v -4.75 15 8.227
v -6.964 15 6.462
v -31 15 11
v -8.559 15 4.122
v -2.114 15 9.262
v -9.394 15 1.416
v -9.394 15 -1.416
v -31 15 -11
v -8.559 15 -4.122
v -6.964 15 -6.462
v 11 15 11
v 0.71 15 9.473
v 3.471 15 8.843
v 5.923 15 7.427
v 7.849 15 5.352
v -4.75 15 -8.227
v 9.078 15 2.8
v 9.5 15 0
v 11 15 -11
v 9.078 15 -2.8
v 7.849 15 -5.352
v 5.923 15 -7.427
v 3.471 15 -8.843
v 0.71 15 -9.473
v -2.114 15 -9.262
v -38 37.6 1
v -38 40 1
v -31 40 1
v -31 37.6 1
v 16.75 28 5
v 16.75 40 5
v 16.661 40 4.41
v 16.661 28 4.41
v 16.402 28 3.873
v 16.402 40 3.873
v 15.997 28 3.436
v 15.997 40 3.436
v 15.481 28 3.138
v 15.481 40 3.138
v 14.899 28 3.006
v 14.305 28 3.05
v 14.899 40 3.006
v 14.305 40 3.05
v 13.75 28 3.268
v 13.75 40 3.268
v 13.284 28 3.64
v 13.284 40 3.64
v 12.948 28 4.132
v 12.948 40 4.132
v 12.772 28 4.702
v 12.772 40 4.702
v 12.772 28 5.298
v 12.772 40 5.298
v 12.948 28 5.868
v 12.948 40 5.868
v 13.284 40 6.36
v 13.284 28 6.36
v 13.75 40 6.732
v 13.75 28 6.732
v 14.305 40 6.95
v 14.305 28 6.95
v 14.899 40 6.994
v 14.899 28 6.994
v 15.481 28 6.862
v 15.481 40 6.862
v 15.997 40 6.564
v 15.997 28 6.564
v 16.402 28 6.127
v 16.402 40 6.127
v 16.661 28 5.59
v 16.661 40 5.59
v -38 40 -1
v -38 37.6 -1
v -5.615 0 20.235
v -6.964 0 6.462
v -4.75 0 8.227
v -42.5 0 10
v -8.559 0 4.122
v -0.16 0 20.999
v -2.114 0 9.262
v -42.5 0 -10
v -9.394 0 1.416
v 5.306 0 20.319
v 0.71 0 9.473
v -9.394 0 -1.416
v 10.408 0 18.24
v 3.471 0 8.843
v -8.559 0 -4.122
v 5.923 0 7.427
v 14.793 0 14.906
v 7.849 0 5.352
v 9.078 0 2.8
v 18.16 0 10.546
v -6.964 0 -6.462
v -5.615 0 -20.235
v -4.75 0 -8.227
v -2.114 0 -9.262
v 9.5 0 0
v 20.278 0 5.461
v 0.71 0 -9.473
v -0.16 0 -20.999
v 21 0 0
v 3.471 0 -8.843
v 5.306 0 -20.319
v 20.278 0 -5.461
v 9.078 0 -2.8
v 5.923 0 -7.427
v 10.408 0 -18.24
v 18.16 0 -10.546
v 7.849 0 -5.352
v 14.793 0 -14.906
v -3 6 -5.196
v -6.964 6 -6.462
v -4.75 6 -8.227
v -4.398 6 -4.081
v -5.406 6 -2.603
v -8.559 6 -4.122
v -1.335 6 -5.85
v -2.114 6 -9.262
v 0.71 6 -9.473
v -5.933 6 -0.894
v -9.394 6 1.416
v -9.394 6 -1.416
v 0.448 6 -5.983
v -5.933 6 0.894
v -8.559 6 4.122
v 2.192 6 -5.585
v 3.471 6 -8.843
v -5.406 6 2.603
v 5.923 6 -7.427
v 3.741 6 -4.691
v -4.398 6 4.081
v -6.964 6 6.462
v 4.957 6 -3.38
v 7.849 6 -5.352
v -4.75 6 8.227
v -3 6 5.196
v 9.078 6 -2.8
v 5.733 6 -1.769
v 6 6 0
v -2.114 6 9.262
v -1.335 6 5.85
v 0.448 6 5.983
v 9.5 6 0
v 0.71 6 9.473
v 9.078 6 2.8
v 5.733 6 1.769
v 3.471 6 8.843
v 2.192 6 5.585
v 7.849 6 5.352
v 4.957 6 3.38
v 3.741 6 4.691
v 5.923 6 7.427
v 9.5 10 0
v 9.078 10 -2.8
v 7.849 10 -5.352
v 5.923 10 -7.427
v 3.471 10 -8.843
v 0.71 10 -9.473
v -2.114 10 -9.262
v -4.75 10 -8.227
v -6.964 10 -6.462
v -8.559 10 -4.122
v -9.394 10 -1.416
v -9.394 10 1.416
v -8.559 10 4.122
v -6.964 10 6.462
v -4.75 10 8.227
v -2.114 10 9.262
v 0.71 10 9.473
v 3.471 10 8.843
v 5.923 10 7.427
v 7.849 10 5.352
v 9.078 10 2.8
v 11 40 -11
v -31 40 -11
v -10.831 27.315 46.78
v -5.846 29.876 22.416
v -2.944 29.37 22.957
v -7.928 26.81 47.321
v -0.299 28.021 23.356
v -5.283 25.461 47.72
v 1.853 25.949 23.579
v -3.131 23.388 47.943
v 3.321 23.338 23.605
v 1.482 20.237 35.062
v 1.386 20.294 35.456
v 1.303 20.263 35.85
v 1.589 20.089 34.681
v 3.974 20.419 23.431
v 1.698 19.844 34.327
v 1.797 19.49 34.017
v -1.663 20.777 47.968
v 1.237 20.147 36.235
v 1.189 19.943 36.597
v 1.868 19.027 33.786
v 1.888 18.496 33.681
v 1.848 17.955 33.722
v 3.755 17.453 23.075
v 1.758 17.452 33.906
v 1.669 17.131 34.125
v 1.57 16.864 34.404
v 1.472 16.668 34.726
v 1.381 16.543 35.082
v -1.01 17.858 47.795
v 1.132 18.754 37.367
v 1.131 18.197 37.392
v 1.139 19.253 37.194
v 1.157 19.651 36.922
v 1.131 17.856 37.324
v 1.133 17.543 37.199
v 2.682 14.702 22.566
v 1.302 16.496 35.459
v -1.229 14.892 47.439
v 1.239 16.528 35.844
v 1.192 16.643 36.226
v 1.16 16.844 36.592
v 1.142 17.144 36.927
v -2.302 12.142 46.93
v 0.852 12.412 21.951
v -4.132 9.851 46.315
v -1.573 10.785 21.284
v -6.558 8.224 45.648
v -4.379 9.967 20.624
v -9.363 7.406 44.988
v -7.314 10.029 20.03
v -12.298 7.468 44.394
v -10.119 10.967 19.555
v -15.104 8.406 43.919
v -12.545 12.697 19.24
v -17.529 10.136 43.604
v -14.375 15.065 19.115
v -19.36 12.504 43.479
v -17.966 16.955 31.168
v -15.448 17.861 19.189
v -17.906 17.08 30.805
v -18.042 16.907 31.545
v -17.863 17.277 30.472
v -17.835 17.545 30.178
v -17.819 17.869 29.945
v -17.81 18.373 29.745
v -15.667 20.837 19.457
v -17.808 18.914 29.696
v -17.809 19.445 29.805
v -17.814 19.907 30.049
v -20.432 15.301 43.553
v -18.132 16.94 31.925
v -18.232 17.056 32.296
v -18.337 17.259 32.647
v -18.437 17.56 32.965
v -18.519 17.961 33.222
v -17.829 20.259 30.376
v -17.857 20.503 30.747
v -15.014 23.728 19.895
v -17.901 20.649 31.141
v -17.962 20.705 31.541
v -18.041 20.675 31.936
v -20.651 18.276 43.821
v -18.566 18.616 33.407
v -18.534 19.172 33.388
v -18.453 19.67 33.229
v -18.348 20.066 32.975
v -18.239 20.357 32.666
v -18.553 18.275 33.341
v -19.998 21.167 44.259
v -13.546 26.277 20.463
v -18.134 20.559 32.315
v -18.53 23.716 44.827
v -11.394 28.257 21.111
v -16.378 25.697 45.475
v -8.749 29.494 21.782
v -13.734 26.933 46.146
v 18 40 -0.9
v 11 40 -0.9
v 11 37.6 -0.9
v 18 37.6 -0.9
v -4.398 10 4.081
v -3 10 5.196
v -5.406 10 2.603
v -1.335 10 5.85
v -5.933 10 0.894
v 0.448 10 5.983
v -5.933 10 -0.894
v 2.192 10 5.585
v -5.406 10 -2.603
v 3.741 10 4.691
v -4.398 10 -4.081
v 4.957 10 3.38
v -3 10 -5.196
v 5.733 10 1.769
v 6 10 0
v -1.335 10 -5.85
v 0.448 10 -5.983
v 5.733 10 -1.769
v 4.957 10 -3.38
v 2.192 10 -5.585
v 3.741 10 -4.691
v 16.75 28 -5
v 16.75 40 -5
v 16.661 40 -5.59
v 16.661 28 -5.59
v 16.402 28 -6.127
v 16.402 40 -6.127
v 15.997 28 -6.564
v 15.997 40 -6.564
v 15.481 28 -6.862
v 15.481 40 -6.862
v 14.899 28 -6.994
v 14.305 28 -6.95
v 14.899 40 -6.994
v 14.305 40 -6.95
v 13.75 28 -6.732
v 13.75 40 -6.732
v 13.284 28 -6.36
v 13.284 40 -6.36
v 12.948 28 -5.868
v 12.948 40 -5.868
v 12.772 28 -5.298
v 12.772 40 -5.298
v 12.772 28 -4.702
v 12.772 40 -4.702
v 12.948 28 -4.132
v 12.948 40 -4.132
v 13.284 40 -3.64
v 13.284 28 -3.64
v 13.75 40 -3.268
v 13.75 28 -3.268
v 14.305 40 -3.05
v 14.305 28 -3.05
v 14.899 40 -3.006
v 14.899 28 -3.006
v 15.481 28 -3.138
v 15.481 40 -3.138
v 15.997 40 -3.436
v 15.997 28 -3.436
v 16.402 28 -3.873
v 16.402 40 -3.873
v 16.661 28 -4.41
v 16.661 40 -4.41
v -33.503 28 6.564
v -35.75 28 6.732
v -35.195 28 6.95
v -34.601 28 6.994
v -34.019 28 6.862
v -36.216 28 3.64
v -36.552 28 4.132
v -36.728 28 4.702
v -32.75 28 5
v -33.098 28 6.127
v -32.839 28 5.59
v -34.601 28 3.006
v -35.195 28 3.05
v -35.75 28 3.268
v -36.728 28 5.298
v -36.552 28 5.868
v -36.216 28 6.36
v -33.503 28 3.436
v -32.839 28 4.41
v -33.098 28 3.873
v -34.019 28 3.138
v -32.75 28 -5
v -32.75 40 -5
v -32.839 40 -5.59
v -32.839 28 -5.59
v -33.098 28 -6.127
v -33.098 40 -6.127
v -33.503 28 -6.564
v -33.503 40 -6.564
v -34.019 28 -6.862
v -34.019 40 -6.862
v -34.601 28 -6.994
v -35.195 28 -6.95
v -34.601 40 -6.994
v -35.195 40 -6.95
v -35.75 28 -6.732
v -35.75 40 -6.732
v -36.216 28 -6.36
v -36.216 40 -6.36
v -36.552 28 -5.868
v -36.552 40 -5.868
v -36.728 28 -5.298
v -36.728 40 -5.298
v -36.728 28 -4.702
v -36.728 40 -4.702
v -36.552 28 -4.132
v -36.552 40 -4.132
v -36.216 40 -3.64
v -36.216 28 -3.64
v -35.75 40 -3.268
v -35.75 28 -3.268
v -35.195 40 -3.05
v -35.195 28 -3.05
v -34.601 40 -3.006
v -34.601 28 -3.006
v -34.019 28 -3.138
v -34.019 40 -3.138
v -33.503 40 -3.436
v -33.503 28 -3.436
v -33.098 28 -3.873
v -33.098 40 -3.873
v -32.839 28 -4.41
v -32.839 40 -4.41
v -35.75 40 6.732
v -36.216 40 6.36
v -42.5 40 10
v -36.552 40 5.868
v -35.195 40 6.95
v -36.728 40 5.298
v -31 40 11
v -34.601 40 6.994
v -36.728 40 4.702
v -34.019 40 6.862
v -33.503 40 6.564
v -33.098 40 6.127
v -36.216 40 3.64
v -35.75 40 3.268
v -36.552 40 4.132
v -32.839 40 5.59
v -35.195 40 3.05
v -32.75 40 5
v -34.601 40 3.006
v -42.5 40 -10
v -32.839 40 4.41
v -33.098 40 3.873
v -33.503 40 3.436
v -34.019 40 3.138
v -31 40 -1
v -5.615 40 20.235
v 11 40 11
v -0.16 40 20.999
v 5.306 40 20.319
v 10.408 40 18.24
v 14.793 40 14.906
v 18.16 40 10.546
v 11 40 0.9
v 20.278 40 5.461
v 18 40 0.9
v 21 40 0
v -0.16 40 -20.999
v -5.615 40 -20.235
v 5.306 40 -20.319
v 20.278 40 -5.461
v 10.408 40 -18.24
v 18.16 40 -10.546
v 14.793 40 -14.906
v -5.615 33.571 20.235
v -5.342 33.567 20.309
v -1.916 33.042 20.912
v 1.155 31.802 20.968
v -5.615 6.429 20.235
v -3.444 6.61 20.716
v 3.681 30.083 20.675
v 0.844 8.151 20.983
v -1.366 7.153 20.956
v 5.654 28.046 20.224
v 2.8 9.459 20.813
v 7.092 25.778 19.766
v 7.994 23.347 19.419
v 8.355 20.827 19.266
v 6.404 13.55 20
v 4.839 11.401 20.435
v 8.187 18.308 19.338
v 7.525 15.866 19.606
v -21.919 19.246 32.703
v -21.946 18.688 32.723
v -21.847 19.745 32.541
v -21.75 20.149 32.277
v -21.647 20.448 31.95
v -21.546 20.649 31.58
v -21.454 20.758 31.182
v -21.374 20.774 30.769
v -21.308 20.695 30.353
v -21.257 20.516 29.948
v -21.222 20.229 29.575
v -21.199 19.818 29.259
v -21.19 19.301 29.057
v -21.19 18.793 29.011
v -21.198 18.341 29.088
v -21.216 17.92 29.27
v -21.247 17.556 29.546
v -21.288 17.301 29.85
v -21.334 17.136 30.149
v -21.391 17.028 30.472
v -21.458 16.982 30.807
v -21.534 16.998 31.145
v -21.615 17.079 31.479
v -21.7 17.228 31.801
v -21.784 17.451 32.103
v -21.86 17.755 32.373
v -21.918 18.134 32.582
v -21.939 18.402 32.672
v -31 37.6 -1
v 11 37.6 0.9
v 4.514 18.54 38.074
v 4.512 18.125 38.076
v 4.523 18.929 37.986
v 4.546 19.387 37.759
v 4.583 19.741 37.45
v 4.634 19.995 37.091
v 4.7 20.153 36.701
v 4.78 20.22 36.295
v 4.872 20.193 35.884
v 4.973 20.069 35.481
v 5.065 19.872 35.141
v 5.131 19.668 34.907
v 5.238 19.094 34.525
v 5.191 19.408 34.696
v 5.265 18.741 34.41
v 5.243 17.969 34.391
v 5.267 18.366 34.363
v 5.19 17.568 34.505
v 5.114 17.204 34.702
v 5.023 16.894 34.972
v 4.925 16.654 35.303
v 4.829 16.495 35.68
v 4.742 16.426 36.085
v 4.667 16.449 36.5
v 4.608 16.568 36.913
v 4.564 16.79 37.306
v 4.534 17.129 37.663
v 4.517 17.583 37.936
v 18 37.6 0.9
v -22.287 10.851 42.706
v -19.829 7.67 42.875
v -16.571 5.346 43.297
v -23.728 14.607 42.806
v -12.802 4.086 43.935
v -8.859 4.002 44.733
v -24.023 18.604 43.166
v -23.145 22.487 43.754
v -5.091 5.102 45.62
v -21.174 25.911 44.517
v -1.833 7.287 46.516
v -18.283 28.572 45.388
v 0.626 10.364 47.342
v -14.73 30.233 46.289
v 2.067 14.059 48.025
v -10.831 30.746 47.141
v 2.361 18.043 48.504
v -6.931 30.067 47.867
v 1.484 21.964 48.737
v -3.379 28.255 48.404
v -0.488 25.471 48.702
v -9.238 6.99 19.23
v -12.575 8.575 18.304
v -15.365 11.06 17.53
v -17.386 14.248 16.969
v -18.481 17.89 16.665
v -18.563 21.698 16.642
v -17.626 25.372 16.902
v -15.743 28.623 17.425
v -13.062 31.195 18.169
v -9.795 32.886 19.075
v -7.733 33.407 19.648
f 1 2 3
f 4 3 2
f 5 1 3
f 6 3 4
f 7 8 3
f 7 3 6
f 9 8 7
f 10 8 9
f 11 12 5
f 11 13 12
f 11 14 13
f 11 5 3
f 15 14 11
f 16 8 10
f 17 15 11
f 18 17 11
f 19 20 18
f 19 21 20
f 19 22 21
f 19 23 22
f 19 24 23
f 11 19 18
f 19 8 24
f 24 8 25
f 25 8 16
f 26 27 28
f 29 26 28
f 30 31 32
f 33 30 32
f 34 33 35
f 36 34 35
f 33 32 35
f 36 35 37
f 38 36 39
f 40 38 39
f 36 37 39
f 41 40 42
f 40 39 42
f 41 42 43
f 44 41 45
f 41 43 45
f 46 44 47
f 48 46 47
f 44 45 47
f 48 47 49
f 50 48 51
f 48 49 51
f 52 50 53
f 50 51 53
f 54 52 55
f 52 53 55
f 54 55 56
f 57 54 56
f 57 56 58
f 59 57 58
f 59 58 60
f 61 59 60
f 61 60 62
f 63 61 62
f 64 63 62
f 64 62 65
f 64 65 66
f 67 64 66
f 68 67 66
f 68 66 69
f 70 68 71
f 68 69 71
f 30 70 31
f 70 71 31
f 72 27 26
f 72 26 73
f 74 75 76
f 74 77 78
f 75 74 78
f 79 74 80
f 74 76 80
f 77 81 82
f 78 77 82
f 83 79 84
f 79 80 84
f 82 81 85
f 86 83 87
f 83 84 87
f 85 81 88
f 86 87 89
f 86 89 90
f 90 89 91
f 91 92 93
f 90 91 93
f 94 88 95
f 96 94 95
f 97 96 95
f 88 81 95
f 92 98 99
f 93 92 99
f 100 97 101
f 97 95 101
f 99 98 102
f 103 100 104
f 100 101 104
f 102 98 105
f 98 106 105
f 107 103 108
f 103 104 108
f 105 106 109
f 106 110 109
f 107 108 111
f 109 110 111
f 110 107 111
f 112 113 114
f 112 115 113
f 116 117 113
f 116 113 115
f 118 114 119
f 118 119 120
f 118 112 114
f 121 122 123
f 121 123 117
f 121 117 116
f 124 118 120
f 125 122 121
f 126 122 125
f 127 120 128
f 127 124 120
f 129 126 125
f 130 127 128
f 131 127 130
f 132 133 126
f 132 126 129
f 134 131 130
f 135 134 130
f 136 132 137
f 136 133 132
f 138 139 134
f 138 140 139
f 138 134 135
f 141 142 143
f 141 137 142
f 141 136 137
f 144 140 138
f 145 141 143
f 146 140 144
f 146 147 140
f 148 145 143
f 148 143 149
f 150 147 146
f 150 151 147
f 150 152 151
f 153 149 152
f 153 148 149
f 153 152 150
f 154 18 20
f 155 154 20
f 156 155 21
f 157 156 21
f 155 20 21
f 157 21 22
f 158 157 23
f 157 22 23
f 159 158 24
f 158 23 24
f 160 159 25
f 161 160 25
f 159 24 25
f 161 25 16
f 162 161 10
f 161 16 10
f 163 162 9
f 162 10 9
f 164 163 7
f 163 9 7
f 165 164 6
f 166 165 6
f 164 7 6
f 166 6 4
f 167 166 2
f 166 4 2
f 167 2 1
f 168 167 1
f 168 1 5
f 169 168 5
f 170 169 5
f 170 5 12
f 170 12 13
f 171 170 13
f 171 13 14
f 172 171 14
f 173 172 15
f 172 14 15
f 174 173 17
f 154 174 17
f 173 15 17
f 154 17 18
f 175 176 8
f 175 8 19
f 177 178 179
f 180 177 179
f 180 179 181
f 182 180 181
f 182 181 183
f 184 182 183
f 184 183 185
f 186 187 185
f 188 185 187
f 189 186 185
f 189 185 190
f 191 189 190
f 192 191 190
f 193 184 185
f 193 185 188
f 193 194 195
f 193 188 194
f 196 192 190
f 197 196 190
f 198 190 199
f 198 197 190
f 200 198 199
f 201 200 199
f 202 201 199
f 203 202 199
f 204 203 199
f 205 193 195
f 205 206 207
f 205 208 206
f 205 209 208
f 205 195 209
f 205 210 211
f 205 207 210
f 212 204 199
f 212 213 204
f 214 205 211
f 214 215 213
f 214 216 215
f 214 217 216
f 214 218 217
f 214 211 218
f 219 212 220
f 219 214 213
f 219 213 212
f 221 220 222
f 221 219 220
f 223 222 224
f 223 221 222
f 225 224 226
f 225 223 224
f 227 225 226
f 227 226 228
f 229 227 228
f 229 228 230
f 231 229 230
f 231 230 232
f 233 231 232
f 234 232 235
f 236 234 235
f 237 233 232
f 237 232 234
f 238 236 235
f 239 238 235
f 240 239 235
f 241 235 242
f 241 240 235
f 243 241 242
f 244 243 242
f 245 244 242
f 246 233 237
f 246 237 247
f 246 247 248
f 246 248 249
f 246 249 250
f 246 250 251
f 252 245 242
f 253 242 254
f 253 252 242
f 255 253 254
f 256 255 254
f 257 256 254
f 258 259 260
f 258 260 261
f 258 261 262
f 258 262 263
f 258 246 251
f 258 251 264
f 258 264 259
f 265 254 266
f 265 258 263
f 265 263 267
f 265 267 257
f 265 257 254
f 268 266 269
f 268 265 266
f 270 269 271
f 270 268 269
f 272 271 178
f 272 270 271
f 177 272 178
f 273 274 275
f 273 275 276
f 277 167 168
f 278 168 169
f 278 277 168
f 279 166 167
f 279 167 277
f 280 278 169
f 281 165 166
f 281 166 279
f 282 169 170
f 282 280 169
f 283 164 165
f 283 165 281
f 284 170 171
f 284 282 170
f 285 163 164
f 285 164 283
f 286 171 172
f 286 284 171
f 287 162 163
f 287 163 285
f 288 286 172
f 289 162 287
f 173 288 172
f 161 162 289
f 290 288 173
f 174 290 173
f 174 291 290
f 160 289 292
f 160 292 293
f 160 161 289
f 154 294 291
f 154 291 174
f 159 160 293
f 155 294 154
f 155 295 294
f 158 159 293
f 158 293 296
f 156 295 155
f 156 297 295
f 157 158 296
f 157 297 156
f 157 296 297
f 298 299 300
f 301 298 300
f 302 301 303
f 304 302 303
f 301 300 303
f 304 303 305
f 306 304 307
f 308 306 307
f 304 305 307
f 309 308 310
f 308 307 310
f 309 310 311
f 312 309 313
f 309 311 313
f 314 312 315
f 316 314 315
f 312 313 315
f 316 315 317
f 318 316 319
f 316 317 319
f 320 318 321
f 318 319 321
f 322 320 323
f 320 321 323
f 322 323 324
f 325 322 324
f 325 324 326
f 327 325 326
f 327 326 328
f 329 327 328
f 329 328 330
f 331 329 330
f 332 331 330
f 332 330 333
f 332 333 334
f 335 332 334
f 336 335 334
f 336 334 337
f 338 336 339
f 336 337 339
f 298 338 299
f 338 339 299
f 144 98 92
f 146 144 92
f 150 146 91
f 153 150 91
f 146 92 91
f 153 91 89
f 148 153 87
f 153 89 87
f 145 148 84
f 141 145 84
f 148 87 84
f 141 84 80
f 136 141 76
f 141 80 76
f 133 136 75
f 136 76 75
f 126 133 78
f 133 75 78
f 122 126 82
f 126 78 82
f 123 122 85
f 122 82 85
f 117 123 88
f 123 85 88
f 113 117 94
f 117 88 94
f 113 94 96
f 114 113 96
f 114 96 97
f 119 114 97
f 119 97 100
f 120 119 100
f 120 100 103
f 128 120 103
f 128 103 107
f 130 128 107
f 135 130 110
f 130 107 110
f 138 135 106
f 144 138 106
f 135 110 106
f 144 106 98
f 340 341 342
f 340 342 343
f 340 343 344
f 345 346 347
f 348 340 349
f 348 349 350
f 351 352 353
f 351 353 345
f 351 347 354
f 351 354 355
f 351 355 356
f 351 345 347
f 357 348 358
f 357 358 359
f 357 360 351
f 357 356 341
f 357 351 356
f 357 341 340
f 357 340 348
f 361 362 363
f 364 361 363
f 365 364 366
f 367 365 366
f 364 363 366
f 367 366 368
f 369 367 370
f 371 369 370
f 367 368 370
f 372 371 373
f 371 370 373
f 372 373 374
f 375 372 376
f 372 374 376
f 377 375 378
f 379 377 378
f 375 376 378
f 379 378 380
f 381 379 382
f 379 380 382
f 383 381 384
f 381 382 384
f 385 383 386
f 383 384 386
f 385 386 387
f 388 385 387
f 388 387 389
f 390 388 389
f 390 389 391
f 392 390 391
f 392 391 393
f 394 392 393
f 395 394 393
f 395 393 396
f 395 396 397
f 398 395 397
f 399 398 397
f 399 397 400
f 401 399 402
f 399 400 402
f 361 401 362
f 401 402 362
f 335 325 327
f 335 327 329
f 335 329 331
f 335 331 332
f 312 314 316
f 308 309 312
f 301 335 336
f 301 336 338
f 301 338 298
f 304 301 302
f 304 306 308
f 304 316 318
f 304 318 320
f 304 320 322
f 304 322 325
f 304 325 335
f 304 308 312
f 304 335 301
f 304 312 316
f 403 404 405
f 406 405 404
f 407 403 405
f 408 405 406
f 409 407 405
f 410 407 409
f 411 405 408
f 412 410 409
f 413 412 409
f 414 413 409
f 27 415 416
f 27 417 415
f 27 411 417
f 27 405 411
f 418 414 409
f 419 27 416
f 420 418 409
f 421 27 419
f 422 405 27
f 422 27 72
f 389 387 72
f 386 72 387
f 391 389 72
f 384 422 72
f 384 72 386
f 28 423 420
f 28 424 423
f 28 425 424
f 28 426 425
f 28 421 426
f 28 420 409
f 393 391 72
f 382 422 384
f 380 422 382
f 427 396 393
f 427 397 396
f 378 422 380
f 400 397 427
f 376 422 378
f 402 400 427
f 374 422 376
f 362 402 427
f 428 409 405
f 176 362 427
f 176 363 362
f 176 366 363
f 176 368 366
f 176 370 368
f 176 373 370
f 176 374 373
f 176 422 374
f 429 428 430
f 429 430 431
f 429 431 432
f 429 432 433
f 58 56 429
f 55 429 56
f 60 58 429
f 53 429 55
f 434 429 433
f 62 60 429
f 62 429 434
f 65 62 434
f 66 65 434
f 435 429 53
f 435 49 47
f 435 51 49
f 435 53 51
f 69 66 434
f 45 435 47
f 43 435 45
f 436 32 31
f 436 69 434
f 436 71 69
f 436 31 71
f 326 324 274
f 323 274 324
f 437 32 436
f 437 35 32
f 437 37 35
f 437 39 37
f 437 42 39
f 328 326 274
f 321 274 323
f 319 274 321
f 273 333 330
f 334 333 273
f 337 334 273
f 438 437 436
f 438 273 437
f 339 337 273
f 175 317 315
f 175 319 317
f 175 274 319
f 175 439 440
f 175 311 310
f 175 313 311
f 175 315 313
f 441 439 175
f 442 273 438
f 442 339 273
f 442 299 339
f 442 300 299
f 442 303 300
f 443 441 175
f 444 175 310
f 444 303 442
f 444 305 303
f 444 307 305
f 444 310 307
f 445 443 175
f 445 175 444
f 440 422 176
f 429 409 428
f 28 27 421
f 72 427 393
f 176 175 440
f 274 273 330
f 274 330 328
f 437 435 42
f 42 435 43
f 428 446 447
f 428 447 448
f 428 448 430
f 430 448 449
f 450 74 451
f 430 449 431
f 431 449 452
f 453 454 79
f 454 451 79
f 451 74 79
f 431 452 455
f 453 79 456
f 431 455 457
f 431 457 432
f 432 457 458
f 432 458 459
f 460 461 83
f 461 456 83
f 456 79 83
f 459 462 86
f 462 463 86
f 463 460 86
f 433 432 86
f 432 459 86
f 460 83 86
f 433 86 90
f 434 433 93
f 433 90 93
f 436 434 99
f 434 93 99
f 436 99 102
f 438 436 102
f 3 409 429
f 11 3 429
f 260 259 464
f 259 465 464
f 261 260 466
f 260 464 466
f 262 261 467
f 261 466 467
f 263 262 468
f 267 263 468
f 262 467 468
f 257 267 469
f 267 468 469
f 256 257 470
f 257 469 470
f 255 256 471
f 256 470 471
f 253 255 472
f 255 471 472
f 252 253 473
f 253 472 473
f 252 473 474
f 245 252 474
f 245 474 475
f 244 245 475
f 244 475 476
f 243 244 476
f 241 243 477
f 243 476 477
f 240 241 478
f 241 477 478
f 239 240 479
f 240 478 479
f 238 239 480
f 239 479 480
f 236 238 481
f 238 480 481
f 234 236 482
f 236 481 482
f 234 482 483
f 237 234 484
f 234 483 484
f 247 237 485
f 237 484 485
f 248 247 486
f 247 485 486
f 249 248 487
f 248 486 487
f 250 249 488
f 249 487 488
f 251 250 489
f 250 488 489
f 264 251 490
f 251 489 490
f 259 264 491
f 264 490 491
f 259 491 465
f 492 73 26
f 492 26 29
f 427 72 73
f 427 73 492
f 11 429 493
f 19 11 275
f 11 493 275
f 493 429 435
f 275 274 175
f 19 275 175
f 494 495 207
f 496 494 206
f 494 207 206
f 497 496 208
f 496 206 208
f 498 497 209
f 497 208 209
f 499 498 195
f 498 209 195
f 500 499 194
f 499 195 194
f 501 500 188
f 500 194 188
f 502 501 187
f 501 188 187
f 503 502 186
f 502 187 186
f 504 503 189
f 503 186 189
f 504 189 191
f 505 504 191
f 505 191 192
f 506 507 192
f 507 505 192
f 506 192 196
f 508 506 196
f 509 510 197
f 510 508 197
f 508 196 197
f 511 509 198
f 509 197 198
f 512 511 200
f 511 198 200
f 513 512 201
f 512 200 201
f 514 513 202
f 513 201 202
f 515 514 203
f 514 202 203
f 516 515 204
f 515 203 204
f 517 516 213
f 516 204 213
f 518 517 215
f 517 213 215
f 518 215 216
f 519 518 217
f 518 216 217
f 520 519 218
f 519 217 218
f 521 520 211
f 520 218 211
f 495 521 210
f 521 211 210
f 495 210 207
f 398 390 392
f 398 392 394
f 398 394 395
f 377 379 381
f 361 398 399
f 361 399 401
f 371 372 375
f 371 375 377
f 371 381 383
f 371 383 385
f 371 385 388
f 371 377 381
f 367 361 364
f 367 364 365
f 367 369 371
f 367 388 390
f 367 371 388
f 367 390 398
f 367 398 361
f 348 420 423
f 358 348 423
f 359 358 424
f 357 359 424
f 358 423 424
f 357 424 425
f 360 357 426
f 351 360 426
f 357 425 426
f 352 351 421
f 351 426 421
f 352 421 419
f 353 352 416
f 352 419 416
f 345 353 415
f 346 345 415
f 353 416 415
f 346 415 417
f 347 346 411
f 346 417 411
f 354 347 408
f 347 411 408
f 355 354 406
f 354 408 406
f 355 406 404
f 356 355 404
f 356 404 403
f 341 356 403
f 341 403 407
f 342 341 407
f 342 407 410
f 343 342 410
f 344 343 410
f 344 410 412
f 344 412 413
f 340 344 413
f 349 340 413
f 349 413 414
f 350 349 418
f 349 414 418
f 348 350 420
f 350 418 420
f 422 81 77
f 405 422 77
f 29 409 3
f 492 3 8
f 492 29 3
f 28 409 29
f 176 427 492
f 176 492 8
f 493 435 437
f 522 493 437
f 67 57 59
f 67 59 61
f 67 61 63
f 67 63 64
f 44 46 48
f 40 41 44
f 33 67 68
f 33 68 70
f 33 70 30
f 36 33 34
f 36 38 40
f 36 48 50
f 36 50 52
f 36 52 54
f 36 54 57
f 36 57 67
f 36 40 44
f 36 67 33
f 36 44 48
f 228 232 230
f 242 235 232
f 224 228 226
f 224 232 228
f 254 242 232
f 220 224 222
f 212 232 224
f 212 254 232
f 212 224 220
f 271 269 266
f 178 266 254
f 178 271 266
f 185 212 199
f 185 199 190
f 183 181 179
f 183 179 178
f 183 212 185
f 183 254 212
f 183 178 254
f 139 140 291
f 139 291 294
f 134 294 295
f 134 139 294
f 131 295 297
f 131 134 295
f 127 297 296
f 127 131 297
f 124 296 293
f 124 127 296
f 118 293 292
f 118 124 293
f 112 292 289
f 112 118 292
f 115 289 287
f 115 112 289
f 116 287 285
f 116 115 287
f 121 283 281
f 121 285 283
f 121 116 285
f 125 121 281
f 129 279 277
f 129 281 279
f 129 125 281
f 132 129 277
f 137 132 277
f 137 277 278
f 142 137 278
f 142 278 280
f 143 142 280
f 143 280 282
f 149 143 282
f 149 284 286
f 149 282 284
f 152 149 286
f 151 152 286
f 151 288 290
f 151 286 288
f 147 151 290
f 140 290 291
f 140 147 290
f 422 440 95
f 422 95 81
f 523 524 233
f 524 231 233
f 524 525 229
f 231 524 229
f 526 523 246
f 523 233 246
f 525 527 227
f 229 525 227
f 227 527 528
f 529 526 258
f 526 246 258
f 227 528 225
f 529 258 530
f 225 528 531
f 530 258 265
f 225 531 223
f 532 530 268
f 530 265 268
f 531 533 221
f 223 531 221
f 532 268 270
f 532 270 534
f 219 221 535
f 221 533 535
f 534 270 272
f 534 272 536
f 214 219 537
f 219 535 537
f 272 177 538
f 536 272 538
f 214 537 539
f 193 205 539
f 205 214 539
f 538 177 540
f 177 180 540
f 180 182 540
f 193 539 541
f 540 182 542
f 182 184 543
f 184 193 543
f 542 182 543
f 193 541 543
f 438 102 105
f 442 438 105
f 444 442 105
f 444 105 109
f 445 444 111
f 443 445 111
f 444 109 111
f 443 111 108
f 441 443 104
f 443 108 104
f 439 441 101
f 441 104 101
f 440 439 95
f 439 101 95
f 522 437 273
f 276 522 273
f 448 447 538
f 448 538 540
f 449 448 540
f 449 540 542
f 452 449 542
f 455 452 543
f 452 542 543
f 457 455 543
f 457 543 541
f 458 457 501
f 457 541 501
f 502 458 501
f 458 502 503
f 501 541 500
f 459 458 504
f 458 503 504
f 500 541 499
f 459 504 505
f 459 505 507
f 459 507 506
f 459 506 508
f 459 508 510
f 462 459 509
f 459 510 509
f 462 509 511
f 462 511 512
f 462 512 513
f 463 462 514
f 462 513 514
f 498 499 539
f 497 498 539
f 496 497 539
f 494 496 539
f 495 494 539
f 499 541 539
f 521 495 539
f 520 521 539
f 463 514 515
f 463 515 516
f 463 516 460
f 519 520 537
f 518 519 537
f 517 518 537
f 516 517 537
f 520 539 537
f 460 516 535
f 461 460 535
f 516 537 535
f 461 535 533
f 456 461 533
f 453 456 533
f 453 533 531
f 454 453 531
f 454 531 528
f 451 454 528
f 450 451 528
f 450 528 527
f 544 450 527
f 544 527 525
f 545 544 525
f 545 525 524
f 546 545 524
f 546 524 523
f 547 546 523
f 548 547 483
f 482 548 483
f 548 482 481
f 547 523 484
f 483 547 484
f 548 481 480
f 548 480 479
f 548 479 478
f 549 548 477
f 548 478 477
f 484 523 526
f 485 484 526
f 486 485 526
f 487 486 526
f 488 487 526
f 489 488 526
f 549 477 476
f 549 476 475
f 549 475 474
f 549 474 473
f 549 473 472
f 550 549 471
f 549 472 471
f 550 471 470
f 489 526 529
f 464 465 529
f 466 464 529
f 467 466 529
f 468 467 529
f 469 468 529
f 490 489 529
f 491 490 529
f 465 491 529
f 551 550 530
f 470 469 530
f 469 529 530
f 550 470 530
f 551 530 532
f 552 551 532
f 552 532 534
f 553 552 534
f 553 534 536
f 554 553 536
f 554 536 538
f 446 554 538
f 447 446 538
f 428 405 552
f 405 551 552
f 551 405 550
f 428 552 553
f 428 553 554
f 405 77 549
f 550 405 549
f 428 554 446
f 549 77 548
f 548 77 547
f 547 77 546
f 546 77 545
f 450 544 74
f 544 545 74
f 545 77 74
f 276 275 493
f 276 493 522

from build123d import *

# Parameters (mm, degrees)
SKETCH1_R           = 6
BOSS_EXTRUDE1_DEPTH = 40
SKETCH2_W           = 42
SKETCH2_H           = 22
CUT_EXTRUDE1_DEPTH  = 25
SKETCH3_R           = 2
CUT_EXTRUDE2_DEPTH  = 12
SKETCH4_R           = 9.5
CUT_EXTRUDE3_DEPTH  = 5
CUT_EXTRUDE4_START  = -6
SKETCH5_R           = 9.5
CUT_EXTRUDE4_DEPTH  = 6
SKETCH7_W           = 7
SKETCH7_H           = 2
SKETCH7_H_2         = 1.8
CUT_EXTRUDE5_DEPTH  = 2.4
BOSS_EXTRUDE2_REACH = 87.524
SKETCH9_R           = 13.5
SKETCH9_R_2         = 10.05
BOSS_EXTRUDE3_REACH = 71.909
SKETCH10_R          = 10.05
SKETCH11_R          = 1.9
CUT_EXTRUDE7_DEPTH  = 13.5


with BuildPart() as part:
    # Sketch1 → Boss-Extrude1 (new body)
    with BuildSketch(Plane(origin=(0, 0, 0), x_dir=(1, 0, 0), z_dir=(0, 1, 0))):
        with BuildLine():
            Line((-42.5, -10), (-5.61521172, -20.235350191))
            ThreePointArc((-5.61521172, -20.235350191), (21, 0), (-5.61521172, 20.235350191))
            Line((-5.61521172, 20.235350191), (-42.5, 10))
            Line((-42.5, 10), (-42.5, -10))
        make_face()
        Circle(SKETCH1_R, mode=Mode.SUBTRACT)
    extrude(amount=BOSS_EXTRUDE1_DEPTH)

    # Sketch2 → Cut-Extrude1 (cut)
    with BuildSketch(Plane(origin=(0, 40, 0), x_dir=(1, 0, 0), z_dir=(0, 1, 0))):
        with Locations((-10, 0)):
            Rectangle(SKETCH2_W, SKETCH2_H)
    extrude(amount=-CUT_EXTRUDE1_DEPTH, mode=Mode.SUBTRACT)

    # Sketch3 → Cut-Extrude2 (cut)
    with BuildSketch(Plane(origin=(0, 40, 0), x_dir=(1, 0, 0), z_dir=(0, 1, 0))):
        with Locations((14.75, 5)):
            Circle(SKETCH3_R)
        with Locations((14.75, -5)):
            Circle(SKETCH3_R)
        with Locations((-34.75, 5)):
            Circle(SKETCH3_R)
        with Locations((-34.75, -5)):
            Circle(SKETCH3_R)
    extrude(amount=-CUT_EXTRUDE2_DEPTH, mode=Mode.SUBTRACT)

    # Sketch4 → Cut-Extrude3 (cut)
    with BuildSketch(Plane(origin=(0, 15, 0), x_dir=(1, 0, 0), z_dir=(0, 1, 0))):
        Circle(SKETCH4_R)
    extrude(amount=-CUT_EXTRUDE3_DEPTH, mode=Mode.SUBTRACT)

    # Sketch5 → Cut-Extrude4 (cut)
    with BuildSketch(Plane.XZ.offset(CUT_EXTRUDE4_START)):
        Circle(SKETCH5_R)
    extrude(amount=CUT_EXTRUDE4_DEPTH, mode=Mode.SUBTRACT)

    # Sketch7 → Cut-Extrude5 (cut)
    with BuildSketch(Plane(origin=(0, 40, 0), x_dir=(1, 0, 0), z_dir=(0, 1, 0))):
        with Locations((-34.5, 0)):
            Rectangle(SKETCH7_W, SKETCH7_H)
        with Locations((14.5, 0)):
            Rectangle(SKETCH7_W, SKETCH7_H_2)
    extrude(amount=-CUT_EXTRUDE5_DEPTH, mode=Mode.SUBTRACT)

    # Sketch9 → Boss-Extrude2 (add, up to next)
    with BuildSketch(Plane(origin=(-8.961867673, -4.60437291, 43.807681948), x_dir=(0, 0.9945218953682737, 0.10452846326765038), z_dir=(0.1993679344171976, 0.10243002349202152, -0.9745565745577032)), mode=Mode.PRIVATE) as boss_extrude2_sk1:
        with Locations((22.005607966, -1.9070974)):
            Circle(SKETCH9_R)
        with Locations((22.005607966, -1.9070974)):
            Circle(SKETCH9_R_2, mode=Mode.SUBTRACT)
    boss_extrude2_tool1 = extrude(boss_extrude2_sk1.sketch, amount=BOSS_EXTRUDE2_REACH, mode=Mode.PRIVATE) - part.part
    add(boss_extrude2_tool1.solids().sort_by_distance((-10.83068, 4.27413, 44.358542))[0])

    # Sketch10 → Boss-Extrude3 (add, up to next)
    with BuildSketch(Plane(origin=(-3.977669313, -2.043622323, 19.443767584), x_dir=(0.9799247046208295, -0.020839623809475377, 0.19827577601224913), z_dir=(-0.19936793441719772, -0.10243002349202134, 0.9745565745577032)), mode=Mode.PRIVATE) as boss_extrude3_sk1:
        with Locations((-1.9070974, 22.005607966)):
            Circle(SKETCH10_R)
    boss_extrude3_tool1 = extrude(boss_extrude3_sk1.sketch, amount=-BOSS_EXTRUDE3_REACH, mode=Mode.PRIVATE) - part.part
    add(boss_extrude3_tool1.solids().sort_by_distance((-5.846481, 19.88118, 21.365849))[0])

    # Sketch11 → Cut-Extrude7 (cut, symmetric)
    with BuildSketch(Plane(origin=(-1.868811857, 0.039743192, -0.378131217), x_dir=(-0.19936793441719755, -0.10243002349202149, 0.9745565745577031), z_dir=(-0.9799247046208296, 0.02083962380947537, -0.19827577601224902))):
        with Locations((32.45139953, 22.005607966)):
            Circle(SKETCH11_R)
    extrude(amount=CUT_EXTRUDE7_DEPTH, both=True, mode=Mode.SUBTRACT)


solid = part.part
